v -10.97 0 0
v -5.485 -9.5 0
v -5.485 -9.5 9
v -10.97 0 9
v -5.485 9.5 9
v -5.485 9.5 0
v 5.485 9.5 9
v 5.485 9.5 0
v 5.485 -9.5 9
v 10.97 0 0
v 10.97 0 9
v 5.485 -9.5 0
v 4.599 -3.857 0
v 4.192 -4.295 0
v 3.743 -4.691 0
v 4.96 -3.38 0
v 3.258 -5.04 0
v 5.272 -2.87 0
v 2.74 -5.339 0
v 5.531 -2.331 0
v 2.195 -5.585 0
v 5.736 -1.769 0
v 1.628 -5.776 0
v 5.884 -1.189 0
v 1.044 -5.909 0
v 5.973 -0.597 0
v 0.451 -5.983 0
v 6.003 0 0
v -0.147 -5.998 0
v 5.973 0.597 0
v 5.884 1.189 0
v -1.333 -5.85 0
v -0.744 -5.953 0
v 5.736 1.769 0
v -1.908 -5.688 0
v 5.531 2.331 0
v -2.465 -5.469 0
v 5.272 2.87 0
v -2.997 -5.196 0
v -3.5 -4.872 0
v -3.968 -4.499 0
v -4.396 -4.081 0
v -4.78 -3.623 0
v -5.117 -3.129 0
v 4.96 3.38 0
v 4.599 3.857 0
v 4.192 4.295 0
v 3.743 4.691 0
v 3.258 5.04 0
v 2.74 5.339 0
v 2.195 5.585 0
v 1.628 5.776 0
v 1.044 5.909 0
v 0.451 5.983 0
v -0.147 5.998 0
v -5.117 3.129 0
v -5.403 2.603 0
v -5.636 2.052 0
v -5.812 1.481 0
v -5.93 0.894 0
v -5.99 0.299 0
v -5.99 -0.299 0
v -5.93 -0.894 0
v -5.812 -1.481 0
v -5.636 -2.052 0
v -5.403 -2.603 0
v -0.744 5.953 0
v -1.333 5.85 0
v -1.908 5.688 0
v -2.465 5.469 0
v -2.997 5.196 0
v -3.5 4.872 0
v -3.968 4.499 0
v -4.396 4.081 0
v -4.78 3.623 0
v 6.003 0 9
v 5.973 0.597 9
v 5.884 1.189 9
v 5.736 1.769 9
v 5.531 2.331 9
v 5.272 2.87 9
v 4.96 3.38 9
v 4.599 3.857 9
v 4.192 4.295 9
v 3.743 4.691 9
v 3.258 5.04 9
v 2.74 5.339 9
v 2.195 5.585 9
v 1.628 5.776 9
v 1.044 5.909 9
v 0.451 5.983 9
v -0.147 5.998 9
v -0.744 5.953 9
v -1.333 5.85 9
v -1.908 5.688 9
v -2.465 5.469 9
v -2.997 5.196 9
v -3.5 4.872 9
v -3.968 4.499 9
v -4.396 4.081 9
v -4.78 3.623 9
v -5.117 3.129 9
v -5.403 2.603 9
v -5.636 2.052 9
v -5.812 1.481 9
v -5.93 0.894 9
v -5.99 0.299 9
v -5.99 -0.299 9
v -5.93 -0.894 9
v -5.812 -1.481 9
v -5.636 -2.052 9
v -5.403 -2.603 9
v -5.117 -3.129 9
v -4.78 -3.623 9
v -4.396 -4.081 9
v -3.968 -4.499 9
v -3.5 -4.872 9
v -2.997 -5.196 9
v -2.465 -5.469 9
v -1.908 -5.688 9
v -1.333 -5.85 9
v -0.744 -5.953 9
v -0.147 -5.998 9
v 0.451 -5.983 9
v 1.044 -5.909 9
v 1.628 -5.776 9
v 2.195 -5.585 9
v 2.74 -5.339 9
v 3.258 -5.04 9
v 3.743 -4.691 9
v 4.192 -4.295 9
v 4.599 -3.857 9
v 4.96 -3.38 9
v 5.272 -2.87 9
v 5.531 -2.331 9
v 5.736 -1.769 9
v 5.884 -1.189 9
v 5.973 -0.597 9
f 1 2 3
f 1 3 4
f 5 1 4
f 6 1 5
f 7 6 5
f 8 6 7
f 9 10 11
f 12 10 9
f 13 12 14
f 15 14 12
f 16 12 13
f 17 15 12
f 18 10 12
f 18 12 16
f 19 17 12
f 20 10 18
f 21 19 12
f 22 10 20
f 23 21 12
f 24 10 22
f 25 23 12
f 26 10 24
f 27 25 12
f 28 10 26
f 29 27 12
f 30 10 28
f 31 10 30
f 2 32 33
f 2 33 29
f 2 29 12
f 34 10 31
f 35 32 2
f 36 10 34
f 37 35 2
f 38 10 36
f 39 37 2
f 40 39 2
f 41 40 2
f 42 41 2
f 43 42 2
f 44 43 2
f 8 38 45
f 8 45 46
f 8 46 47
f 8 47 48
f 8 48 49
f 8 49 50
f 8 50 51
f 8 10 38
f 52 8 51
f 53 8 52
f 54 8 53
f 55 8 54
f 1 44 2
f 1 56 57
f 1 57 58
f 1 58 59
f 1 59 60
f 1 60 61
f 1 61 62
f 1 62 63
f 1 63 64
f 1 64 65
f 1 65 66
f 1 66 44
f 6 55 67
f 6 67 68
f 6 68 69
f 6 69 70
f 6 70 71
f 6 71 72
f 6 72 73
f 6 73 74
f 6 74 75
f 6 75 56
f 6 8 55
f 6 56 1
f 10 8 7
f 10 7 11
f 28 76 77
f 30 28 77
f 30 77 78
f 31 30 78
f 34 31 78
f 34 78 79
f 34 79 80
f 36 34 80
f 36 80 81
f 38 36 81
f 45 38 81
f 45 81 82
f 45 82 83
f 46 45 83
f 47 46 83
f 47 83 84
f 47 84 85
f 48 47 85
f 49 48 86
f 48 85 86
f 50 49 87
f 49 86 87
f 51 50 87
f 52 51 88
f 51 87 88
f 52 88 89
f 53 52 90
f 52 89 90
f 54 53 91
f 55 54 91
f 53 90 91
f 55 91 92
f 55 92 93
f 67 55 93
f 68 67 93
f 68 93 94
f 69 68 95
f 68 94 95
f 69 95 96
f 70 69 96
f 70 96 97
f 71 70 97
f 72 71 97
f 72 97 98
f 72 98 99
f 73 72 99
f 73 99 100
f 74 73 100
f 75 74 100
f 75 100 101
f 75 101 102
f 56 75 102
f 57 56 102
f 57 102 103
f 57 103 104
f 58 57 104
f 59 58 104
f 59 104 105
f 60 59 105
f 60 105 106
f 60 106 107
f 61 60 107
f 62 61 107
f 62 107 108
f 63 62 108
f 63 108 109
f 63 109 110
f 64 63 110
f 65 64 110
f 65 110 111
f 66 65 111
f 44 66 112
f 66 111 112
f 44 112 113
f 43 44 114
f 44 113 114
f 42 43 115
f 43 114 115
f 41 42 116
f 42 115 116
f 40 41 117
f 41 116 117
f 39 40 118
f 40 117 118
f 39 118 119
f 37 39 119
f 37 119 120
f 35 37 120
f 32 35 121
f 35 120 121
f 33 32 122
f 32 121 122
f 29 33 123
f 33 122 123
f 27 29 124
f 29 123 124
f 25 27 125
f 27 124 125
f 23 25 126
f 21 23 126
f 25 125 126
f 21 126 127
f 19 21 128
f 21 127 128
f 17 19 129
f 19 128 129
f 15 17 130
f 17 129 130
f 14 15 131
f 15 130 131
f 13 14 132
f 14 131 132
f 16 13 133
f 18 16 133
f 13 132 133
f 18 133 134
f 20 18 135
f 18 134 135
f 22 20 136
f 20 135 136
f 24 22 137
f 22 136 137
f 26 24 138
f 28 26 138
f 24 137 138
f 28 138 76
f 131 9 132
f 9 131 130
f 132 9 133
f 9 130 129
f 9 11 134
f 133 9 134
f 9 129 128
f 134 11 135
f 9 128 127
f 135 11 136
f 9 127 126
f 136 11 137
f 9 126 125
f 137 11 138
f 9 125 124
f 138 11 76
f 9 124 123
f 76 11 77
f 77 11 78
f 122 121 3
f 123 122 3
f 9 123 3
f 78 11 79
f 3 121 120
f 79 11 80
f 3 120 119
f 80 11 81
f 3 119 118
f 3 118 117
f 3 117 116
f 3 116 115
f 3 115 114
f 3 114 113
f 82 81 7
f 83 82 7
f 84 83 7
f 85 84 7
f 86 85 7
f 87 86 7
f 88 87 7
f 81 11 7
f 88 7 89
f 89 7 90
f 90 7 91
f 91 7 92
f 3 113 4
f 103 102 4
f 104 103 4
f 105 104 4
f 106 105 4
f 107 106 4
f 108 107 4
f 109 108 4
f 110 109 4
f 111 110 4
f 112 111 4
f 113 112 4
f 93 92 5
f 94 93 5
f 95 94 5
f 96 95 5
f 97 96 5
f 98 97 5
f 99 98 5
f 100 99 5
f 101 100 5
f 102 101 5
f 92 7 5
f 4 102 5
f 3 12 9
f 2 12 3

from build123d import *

# Parameters (mm, degrees)
EXTRUDE_1_DEPTH        = 9
M12X1_25_1_D           = 10.8
M12X1_25_1_DEPTH       = 27.75
M12X1_25_1_CBORE_D     = 12
M12X1_25_1_CBORE_DEPTH = 24
M12X1_25_1_TIP         = 3.244647343


with BuildPart() as part:
    # 草图1 → 拉伸1 (new body)
    with BuildSketch(Plane.XY):
        Polygon((-5.484827557, 9.5), (5.484827557, 9.5), (10.969655115, 0), (5.484827557, -9.5), (-5.484827557, -9.5), (-10.969655115, 0), align=None)
    extrude(amount=EXTRUDE_1_DEPTH)

    # M12x1.25 螺纹孔1
    with Locations(Plane(origin=(0.002521047, 0, 9), x_dir=(1, 0, 0), z_dir=(0, 0, 1))):
        with Locations((0, 0)):
            CounterBoreHole(M12X1_25_1_D / 2, M12X1_25_1_CBORE_D / 2, M12X1_25_1_CBORE_DEPTH, depth=M12X1_25_1_DEPTH)
            with Locations((0, 0, -(M12X1_25_1_DEPTH + M12X1_25_1_TIP / 2))):  # 118° drill point
                Cone(0, M12X1_25_1_D / 2, M12X1_25_1_TIP, mode=Mode.SUBTRACT)


solid = part.part
